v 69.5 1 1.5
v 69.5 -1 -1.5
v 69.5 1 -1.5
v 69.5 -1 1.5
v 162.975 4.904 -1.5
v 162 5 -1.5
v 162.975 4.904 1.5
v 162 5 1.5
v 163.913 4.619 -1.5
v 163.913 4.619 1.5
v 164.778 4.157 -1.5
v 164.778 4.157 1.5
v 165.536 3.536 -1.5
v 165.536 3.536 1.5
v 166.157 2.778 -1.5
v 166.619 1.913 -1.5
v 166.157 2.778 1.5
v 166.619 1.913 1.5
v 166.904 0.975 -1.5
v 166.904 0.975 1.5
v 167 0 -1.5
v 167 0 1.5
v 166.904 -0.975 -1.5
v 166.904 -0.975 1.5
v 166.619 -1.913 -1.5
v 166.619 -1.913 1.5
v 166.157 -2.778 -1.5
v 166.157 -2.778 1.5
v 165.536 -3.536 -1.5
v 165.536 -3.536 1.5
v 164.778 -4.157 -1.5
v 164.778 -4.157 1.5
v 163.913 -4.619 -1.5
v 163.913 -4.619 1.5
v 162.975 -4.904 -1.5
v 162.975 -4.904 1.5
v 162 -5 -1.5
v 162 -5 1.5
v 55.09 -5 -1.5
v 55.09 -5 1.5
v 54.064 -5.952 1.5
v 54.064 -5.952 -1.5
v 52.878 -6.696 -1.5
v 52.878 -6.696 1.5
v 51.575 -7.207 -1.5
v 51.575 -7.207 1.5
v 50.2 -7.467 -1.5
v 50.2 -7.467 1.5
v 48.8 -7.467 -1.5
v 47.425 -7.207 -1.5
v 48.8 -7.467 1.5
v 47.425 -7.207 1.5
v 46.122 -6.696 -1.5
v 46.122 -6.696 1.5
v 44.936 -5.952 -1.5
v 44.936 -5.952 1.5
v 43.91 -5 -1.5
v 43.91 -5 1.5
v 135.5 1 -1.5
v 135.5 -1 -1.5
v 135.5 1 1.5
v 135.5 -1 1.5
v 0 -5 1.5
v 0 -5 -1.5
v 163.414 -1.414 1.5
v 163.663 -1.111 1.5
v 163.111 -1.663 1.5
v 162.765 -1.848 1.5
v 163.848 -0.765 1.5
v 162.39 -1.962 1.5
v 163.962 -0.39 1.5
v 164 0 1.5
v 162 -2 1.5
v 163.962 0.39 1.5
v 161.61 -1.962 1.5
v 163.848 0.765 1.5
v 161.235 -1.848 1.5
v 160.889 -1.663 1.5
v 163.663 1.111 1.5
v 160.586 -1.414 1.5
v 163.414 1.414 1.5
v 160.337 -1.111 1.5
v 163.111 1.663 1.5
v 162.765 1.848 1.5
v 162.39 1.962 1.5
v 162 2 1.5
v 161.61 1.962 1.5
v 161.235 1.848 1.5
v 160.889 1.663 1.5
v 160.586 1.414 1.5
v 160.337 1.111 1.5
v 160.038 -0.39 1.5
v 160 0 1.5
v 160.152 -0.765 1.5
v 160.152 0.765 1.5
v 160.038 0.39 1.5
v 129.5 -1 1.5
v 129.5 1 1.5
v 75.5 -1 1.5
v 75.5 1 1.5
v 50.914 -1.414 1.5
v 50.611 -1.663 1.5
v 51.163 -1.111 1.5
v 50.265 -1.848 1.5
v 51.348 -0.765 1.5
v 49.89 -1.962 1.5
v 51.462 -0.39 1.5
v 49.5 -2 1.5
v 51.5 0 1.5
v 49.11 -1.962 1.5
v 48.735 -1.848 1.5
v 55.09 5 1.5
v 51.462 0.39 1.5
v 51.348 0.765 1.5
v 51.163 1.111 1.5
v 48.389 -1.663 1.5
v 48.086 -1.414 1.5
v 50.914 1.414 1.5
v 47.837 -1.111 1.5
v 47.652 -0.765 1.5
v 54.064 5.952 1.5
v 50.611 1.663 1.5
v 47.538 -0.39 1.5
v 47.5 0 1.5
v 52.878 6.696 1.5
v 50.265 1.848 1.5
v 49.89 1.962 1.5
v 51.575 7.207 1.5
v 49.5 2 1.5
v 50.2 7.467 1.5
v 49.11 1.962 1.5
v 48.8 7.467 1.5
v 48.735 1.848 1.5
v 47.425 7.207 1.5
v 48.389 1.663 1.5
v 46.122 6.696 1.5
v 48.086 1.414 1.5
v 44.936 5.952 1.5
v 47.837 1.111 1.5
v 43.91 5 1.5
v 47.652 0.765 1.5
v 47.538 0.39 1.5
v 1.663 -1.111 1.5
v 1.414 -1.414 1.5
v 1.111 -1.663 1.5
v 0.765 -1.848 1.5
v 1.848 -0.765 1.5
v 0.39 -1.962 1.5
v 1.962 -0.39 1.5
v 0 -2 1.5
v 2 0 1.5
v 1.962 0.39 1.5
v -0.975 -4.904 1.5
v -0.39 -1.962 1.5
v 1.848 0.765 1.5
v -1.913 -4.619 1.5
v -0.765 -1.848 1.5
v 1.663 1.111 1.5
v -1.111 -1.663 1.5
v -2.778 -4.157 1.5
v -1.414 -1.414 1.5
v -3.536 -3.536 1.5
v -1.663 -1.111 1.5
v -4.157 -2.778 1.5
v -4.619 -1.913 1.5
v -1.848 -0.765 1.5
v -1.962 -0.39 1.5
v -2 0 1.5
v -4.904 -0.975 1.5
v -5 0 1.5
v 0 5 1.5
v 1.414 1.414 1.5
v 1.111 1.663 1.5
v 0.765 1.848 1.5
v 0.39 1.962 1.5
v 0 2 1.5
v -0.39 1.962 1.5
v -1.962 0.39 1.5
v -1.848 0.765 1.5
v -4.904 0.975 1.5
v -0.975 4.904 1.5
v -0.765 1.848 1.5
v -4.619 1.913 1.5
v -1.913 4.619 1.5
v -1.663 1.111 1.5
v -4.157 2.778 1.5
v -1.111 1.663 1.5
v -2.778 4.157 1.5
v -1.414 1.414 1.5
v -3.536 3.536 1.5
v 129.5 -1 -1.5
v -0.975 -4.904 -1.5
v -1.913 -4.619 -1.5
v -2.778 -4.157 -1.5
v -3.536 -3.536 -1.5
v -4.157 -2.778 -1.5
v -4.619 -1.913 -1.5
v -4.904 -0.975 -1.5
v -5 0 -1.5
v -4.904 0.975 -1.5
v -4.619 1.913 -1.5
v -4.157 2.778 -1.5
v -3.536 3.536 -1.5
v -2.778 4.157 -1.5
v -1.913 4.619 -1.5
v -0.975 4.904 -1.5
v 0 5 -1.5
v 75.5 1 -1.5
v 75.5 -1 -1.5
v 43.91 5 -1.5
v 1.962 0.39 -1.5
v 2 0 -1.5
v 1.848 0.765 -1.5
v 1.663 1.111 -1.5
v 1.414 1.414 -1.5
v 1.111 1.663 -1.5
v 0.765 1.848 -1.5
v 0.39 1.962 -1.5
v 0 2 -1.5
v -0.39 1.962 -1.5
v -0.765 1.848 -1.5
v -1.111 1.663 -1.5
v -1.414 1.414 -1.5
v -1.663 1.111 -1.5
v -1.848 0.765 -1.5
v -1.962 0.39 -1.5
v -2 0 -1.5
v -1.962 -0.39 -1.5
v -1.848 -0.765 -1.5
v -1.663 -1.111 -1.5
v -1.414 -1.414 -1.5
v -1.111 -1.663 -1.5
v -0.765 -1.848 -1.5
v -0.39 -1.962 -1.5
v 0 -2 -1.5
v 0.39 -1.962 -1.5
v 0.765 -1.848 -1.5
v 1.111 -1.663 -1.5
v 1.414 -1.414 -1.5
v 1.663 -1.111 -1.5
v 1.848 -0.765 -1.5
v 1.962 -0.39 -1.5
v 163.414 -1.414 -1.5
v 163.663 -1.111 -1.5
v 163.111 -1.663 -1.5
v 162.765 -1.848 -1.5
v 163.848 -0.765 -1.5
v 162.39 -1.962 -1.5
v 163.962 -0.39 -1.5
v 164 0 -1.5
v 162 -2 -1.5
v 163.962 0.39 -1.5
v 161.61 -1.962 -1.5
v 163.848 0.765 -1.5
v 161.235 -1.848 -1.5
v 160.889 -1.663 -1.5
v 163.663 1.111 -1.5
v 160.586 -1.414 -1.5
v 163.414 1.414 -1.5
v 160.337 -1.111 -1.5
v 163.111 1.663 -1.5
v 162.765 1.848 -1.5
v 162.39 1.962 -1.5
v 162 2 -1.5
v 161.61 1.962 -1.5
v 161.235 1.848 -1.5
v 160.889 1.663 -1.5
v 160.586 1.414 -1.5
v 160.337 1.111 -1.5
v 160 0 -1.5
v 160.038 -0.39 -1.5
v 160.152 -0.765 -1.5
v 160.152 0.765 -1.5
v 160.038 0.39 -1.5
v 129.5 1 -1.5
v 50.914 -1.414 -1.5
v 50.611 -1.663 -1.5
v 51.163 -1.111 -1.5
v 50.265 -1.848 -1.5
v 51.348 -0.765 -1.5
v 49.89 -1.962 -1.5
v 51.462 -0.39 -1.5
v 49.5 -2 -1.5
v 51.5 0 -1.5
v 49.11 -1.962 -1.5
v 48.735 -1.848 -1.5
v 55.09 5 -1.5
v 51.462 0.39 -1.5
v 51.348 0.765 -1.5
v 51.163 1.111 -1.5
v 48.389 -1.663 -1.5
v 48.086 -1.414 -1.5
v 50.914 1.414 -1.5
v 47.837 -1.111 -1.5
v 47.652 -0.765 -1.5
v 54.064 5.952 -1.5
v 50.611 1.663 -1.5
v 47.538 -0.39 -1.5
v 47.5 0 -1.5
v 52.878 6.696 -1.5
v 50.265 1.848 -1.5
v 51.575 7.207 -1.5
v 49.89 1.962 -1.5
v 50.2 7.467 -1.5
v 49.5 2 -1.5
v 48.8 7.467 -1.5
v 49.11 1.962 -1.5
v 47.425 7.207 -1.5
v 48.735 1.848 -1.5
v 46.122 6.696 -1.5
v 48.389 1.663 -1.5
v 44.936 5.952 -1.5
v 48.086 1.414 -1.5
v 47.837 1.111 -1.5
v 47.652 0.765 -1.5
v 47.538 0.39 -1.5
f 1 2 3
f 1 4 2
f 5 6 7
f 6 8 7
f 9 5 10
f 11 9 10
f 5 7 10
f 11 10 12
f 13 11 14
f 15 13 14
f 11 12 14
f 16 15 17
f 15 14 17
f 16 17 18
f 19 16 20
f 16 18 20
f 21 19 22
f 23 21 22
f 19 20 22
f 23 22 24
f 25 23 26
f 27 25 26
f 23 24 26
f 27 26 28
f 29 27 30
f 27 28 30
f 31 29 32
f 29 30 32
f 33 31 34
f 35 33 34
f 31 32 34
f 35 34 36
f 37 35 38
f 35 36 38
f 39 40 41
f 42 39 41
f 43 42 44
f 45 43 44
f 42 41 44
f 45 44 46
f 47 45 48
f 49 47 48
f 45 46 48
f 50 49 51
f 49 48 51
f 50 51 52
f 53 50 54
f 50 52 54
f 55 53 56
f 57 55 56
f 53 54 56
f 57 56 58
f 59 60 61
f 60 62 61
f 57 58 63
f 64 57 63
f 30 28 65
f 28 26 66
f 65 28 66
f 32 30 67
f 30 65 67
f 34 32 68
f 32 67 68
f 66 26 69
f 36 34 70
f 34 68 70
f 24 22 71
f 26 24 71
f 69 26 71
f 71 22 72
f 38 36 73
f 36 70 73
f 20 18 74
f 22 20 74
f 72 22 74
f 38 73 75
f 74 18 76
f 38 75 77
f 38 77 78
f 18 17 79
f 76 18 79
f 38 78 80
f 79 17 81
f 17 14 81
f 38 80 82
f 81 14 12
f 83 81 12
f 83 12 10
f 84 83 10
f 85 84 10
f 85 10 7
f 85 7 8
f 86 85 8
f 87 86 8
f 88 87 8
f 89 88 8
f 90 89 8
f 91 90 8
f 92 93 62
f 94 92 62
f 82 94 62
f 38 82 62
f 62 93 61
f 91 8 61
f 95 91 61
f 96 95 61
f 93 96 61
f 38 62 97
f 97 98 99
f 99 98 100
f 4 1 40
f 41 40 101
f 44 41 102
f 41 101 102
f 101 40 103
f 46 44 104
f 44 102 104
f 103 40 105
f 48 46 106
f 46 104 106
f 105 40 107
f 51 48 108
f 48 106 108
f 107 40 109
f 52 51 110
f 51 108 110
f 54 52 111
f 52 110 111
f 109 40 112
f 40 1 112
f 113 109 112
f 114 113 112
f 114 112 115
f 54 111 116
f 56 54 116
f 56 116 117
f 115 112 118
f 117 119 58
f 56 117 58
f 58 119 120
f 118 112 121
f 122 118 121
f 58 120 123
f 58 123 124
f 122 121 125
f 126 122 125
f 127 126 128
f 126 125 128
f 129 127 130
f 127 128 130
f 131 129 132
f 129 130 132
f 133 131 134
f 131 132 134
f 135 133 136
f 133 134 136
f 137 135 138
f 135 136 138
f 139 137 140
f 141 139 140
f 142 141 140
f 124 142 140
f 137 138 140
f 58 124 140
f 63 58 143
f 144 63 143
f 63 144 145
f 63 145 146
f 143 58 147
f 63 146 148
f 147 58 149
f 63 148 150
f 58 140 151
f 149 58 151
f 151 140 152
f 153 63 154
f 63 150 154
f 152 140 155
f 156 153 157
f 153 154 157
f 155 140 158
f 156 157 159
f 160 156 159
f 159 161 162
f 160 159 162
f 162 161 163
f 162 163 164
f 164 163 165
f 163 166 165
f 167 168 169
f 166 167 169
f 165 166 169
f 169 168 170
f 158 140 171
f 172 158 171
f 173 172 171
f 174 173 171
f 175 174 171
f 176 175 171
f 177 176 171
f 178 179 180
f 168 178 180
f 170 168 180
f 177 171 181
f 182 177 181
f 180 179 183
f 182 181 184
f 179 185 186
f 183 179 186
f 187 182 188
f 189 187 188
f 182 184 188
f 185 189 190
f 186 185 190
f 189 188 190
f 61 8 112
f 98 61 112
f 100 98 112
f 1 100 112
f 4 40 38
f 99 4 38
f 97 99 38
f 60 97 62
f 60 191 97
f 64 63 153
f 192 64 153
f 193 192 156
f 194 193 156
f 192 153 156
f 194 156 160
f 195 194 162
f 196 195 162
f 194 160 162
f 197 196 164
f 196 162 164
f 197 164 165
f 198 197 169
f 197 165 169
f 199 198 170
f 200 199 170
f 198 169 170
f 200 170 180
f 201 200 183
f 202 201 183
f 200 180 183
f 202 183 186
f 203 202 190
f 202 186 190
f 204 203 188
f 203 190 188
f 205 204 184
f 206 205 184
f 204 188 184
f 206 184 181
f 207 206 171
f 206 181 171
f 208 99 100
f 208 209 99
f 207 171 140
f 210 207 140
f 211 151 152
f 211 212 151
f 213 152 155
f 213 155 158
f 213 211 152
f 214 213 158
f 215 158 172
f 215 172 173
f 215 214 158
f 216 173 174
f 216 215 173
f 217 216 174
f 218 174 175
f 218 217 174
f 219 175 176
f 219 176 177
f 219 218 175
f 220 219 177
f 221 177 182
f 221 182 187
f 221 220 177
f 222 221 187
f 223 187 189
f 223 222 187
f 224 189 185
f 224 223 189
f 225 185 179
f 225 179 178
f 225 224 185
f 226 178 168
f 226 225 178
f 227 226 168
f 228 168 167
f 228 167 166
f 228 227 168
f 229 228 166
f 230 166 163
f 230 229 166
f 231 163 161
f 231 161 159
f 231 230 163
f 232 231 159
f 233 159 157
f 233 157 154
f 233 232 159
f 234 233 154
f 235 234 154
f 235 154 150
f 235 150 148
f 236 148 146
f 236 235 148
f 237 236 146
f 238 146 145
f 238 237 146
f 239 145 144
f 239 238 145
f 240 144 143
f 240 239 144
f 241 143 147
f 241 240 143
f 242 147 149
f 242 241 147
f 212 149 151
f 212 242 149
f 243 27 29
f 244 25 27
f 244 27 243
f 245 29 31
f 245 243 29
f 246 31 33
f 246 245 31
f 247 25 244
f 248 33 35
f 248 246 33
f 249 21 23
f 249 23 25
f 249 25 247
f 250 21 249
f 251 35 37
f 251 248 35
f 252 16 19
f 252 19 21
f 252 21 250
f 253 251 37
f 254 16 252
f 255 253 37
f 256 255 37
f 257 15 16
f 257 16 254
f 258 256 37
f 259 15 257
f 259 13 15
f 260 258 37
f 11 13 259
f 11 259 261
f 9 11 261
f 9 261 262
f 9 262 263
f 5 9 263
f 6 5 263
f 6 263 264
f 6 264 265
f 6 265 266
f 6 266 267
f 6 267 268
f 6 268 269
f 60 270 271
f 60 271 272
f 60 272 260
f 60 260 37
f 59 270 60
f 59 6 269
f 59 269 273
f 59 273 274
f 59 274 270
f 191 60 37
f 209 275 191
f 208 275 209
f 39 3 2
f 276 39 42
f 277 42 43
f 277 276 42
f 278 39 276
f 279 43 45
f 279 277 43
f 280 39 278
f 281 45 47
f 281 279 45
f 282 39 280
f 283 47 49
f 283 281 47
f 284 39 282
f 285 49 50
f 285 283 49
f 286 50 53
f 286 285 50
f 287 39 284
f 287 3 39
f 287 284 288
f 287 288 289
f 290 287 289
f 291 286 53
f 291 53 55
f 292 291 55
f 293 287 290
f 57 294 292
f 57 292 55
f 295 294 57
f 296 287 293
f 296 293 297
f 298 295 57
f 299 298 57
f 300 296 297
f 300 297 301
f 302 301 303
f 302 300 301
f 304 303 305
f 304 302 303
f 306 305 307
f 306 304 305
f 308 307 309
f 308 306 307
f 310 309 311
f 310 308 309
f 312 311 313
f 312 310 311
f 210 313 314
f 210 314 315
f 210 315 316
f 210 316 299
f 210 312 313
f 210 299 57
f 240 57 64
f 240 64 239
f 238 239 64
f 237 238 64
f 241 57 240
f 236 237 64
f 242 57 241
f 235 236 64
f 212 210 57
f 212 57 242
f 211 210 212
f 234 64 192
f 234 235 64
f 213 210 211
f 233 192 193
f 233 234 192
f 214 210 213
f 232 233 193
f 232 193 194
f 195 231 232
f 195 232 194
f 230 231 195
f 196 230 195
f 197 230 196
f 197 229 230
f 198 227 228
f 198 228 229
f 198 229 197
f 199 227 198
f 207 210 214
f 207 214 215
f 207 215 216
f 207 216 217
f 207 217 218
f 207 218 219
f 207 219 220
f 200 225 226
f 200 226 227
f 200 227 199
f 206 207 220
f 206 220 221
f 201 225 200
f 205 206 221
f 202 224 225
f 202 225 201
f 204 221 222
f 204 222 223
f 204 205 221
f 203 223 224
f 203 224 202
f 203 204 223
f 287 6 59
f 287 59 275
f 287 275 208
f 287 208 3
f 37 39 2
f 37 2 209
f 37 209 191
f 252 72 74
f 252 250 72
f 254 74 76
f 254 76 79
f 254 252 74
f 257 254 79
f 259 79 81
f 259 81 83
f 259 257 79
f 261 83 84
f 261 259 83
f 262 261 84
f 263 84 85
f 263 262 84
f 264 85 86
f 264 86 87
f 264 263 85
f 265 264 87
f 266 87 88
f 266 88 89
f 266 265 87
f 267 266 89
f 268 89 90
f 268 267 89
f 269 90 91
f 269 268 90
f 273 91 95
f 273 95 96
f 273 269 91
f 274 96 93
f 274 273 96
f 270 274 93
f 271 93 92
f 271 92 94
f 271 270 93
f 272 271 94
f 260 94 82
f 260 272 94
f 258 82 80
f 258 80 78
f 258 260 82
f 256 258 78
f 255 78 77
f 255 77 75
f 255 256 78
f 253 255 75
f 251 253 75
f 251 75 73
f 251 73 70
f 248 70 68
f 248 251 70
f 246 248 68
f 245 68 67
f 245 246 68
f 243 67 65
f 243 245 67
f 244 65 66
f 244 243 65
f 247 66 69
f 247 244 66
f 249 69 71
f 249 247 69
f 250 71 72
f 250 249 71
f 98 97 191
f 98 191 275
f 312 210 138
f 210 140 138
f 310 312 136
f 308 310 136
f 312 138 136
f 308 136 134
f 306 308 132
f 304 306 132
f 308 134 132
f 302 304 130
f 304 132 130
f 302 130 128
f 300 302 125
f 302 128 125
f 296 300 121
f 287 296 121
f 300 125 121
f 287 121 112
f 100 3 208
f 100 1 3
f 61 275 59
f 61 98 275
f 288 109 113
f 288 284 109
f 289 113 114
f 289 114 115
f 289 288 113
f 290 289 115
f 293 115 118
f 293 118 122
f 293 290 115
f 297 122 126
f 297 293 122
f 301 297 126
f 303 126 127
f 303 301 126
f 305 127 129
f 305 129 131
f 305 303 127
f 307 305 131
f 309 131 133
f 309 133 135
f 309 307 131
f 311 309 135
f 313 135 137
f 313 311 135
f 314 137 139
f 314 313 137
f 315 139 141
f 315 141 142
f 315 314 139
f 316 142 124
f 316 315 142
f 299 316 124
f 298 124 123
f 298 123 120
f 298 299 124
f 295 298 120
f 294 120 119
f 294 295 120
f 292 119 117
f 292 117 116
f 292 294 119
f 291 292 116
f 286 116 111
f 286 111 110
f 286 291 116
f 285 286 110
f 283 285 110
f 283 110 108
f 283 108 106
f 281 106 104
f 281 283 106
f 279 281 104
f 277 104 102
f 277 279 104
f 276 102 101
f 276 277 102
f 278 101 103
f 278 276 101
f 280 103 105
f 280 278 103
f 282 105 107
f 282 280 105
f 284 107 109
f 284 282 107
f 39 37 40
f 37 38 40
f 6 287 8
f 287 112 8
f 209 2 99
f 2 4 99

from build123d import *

# Parameters (mm, degrees)
SKETCH_3_R      = 2
SKETCH_3_W      = 6
SKETCH_3_H      = 2
EXTRUDE_1_DEPTH = 1.5


with BuildPart() as part:
    # 草图3 → 凸台-拉伸1 (new, symmetric)
    with BuildSketch(Plane.XY):
        with BuildLine():
            Line((0, 5), (43.909830056, 5))
            ThreePointArc((43.909830056, 5), (49.5, 7.5), (55.090169944, 5))
            Line((55.090169944, 5), (162, 5))
            ThreePointArc((162, 5), (167, 0), (162, -5))
            Line((162, -5), (55.090169944, -5))
            ThreePointArc((55.090169944, -5), (49.5, -7.5), (43.909830056, -5))
            Line((43.909830056, -5), (0, -5))
            ThreePointArc((0, -5), (-5, 0), (0, 5))
        make_face()
        with Locations((162, 0)):
            Circle(SKETCH_3_R, mode=Mode.SUBTRACT)
        Circle(SKETCH_3_R, mode=Mode.SUBTRACT)
        with Locations((49.5, 0)):
            Circle(SKETCH_3_R, mode=Mode.SUBTRACT)
        with Locations((72.5, 0)):
            Rectangle(SKETCH_3_W, SKETCH_3_H, mode=Mode.SUBTRACT)
        with Locations((132.5, 0)):
            Rectangle(SKETCH_3_W, SKETCH_3_H, mode=Mode.SUBTRACT)
    extrude(amount=EXTRUDE_1_DEPTH, both=True)


solid = part.part
